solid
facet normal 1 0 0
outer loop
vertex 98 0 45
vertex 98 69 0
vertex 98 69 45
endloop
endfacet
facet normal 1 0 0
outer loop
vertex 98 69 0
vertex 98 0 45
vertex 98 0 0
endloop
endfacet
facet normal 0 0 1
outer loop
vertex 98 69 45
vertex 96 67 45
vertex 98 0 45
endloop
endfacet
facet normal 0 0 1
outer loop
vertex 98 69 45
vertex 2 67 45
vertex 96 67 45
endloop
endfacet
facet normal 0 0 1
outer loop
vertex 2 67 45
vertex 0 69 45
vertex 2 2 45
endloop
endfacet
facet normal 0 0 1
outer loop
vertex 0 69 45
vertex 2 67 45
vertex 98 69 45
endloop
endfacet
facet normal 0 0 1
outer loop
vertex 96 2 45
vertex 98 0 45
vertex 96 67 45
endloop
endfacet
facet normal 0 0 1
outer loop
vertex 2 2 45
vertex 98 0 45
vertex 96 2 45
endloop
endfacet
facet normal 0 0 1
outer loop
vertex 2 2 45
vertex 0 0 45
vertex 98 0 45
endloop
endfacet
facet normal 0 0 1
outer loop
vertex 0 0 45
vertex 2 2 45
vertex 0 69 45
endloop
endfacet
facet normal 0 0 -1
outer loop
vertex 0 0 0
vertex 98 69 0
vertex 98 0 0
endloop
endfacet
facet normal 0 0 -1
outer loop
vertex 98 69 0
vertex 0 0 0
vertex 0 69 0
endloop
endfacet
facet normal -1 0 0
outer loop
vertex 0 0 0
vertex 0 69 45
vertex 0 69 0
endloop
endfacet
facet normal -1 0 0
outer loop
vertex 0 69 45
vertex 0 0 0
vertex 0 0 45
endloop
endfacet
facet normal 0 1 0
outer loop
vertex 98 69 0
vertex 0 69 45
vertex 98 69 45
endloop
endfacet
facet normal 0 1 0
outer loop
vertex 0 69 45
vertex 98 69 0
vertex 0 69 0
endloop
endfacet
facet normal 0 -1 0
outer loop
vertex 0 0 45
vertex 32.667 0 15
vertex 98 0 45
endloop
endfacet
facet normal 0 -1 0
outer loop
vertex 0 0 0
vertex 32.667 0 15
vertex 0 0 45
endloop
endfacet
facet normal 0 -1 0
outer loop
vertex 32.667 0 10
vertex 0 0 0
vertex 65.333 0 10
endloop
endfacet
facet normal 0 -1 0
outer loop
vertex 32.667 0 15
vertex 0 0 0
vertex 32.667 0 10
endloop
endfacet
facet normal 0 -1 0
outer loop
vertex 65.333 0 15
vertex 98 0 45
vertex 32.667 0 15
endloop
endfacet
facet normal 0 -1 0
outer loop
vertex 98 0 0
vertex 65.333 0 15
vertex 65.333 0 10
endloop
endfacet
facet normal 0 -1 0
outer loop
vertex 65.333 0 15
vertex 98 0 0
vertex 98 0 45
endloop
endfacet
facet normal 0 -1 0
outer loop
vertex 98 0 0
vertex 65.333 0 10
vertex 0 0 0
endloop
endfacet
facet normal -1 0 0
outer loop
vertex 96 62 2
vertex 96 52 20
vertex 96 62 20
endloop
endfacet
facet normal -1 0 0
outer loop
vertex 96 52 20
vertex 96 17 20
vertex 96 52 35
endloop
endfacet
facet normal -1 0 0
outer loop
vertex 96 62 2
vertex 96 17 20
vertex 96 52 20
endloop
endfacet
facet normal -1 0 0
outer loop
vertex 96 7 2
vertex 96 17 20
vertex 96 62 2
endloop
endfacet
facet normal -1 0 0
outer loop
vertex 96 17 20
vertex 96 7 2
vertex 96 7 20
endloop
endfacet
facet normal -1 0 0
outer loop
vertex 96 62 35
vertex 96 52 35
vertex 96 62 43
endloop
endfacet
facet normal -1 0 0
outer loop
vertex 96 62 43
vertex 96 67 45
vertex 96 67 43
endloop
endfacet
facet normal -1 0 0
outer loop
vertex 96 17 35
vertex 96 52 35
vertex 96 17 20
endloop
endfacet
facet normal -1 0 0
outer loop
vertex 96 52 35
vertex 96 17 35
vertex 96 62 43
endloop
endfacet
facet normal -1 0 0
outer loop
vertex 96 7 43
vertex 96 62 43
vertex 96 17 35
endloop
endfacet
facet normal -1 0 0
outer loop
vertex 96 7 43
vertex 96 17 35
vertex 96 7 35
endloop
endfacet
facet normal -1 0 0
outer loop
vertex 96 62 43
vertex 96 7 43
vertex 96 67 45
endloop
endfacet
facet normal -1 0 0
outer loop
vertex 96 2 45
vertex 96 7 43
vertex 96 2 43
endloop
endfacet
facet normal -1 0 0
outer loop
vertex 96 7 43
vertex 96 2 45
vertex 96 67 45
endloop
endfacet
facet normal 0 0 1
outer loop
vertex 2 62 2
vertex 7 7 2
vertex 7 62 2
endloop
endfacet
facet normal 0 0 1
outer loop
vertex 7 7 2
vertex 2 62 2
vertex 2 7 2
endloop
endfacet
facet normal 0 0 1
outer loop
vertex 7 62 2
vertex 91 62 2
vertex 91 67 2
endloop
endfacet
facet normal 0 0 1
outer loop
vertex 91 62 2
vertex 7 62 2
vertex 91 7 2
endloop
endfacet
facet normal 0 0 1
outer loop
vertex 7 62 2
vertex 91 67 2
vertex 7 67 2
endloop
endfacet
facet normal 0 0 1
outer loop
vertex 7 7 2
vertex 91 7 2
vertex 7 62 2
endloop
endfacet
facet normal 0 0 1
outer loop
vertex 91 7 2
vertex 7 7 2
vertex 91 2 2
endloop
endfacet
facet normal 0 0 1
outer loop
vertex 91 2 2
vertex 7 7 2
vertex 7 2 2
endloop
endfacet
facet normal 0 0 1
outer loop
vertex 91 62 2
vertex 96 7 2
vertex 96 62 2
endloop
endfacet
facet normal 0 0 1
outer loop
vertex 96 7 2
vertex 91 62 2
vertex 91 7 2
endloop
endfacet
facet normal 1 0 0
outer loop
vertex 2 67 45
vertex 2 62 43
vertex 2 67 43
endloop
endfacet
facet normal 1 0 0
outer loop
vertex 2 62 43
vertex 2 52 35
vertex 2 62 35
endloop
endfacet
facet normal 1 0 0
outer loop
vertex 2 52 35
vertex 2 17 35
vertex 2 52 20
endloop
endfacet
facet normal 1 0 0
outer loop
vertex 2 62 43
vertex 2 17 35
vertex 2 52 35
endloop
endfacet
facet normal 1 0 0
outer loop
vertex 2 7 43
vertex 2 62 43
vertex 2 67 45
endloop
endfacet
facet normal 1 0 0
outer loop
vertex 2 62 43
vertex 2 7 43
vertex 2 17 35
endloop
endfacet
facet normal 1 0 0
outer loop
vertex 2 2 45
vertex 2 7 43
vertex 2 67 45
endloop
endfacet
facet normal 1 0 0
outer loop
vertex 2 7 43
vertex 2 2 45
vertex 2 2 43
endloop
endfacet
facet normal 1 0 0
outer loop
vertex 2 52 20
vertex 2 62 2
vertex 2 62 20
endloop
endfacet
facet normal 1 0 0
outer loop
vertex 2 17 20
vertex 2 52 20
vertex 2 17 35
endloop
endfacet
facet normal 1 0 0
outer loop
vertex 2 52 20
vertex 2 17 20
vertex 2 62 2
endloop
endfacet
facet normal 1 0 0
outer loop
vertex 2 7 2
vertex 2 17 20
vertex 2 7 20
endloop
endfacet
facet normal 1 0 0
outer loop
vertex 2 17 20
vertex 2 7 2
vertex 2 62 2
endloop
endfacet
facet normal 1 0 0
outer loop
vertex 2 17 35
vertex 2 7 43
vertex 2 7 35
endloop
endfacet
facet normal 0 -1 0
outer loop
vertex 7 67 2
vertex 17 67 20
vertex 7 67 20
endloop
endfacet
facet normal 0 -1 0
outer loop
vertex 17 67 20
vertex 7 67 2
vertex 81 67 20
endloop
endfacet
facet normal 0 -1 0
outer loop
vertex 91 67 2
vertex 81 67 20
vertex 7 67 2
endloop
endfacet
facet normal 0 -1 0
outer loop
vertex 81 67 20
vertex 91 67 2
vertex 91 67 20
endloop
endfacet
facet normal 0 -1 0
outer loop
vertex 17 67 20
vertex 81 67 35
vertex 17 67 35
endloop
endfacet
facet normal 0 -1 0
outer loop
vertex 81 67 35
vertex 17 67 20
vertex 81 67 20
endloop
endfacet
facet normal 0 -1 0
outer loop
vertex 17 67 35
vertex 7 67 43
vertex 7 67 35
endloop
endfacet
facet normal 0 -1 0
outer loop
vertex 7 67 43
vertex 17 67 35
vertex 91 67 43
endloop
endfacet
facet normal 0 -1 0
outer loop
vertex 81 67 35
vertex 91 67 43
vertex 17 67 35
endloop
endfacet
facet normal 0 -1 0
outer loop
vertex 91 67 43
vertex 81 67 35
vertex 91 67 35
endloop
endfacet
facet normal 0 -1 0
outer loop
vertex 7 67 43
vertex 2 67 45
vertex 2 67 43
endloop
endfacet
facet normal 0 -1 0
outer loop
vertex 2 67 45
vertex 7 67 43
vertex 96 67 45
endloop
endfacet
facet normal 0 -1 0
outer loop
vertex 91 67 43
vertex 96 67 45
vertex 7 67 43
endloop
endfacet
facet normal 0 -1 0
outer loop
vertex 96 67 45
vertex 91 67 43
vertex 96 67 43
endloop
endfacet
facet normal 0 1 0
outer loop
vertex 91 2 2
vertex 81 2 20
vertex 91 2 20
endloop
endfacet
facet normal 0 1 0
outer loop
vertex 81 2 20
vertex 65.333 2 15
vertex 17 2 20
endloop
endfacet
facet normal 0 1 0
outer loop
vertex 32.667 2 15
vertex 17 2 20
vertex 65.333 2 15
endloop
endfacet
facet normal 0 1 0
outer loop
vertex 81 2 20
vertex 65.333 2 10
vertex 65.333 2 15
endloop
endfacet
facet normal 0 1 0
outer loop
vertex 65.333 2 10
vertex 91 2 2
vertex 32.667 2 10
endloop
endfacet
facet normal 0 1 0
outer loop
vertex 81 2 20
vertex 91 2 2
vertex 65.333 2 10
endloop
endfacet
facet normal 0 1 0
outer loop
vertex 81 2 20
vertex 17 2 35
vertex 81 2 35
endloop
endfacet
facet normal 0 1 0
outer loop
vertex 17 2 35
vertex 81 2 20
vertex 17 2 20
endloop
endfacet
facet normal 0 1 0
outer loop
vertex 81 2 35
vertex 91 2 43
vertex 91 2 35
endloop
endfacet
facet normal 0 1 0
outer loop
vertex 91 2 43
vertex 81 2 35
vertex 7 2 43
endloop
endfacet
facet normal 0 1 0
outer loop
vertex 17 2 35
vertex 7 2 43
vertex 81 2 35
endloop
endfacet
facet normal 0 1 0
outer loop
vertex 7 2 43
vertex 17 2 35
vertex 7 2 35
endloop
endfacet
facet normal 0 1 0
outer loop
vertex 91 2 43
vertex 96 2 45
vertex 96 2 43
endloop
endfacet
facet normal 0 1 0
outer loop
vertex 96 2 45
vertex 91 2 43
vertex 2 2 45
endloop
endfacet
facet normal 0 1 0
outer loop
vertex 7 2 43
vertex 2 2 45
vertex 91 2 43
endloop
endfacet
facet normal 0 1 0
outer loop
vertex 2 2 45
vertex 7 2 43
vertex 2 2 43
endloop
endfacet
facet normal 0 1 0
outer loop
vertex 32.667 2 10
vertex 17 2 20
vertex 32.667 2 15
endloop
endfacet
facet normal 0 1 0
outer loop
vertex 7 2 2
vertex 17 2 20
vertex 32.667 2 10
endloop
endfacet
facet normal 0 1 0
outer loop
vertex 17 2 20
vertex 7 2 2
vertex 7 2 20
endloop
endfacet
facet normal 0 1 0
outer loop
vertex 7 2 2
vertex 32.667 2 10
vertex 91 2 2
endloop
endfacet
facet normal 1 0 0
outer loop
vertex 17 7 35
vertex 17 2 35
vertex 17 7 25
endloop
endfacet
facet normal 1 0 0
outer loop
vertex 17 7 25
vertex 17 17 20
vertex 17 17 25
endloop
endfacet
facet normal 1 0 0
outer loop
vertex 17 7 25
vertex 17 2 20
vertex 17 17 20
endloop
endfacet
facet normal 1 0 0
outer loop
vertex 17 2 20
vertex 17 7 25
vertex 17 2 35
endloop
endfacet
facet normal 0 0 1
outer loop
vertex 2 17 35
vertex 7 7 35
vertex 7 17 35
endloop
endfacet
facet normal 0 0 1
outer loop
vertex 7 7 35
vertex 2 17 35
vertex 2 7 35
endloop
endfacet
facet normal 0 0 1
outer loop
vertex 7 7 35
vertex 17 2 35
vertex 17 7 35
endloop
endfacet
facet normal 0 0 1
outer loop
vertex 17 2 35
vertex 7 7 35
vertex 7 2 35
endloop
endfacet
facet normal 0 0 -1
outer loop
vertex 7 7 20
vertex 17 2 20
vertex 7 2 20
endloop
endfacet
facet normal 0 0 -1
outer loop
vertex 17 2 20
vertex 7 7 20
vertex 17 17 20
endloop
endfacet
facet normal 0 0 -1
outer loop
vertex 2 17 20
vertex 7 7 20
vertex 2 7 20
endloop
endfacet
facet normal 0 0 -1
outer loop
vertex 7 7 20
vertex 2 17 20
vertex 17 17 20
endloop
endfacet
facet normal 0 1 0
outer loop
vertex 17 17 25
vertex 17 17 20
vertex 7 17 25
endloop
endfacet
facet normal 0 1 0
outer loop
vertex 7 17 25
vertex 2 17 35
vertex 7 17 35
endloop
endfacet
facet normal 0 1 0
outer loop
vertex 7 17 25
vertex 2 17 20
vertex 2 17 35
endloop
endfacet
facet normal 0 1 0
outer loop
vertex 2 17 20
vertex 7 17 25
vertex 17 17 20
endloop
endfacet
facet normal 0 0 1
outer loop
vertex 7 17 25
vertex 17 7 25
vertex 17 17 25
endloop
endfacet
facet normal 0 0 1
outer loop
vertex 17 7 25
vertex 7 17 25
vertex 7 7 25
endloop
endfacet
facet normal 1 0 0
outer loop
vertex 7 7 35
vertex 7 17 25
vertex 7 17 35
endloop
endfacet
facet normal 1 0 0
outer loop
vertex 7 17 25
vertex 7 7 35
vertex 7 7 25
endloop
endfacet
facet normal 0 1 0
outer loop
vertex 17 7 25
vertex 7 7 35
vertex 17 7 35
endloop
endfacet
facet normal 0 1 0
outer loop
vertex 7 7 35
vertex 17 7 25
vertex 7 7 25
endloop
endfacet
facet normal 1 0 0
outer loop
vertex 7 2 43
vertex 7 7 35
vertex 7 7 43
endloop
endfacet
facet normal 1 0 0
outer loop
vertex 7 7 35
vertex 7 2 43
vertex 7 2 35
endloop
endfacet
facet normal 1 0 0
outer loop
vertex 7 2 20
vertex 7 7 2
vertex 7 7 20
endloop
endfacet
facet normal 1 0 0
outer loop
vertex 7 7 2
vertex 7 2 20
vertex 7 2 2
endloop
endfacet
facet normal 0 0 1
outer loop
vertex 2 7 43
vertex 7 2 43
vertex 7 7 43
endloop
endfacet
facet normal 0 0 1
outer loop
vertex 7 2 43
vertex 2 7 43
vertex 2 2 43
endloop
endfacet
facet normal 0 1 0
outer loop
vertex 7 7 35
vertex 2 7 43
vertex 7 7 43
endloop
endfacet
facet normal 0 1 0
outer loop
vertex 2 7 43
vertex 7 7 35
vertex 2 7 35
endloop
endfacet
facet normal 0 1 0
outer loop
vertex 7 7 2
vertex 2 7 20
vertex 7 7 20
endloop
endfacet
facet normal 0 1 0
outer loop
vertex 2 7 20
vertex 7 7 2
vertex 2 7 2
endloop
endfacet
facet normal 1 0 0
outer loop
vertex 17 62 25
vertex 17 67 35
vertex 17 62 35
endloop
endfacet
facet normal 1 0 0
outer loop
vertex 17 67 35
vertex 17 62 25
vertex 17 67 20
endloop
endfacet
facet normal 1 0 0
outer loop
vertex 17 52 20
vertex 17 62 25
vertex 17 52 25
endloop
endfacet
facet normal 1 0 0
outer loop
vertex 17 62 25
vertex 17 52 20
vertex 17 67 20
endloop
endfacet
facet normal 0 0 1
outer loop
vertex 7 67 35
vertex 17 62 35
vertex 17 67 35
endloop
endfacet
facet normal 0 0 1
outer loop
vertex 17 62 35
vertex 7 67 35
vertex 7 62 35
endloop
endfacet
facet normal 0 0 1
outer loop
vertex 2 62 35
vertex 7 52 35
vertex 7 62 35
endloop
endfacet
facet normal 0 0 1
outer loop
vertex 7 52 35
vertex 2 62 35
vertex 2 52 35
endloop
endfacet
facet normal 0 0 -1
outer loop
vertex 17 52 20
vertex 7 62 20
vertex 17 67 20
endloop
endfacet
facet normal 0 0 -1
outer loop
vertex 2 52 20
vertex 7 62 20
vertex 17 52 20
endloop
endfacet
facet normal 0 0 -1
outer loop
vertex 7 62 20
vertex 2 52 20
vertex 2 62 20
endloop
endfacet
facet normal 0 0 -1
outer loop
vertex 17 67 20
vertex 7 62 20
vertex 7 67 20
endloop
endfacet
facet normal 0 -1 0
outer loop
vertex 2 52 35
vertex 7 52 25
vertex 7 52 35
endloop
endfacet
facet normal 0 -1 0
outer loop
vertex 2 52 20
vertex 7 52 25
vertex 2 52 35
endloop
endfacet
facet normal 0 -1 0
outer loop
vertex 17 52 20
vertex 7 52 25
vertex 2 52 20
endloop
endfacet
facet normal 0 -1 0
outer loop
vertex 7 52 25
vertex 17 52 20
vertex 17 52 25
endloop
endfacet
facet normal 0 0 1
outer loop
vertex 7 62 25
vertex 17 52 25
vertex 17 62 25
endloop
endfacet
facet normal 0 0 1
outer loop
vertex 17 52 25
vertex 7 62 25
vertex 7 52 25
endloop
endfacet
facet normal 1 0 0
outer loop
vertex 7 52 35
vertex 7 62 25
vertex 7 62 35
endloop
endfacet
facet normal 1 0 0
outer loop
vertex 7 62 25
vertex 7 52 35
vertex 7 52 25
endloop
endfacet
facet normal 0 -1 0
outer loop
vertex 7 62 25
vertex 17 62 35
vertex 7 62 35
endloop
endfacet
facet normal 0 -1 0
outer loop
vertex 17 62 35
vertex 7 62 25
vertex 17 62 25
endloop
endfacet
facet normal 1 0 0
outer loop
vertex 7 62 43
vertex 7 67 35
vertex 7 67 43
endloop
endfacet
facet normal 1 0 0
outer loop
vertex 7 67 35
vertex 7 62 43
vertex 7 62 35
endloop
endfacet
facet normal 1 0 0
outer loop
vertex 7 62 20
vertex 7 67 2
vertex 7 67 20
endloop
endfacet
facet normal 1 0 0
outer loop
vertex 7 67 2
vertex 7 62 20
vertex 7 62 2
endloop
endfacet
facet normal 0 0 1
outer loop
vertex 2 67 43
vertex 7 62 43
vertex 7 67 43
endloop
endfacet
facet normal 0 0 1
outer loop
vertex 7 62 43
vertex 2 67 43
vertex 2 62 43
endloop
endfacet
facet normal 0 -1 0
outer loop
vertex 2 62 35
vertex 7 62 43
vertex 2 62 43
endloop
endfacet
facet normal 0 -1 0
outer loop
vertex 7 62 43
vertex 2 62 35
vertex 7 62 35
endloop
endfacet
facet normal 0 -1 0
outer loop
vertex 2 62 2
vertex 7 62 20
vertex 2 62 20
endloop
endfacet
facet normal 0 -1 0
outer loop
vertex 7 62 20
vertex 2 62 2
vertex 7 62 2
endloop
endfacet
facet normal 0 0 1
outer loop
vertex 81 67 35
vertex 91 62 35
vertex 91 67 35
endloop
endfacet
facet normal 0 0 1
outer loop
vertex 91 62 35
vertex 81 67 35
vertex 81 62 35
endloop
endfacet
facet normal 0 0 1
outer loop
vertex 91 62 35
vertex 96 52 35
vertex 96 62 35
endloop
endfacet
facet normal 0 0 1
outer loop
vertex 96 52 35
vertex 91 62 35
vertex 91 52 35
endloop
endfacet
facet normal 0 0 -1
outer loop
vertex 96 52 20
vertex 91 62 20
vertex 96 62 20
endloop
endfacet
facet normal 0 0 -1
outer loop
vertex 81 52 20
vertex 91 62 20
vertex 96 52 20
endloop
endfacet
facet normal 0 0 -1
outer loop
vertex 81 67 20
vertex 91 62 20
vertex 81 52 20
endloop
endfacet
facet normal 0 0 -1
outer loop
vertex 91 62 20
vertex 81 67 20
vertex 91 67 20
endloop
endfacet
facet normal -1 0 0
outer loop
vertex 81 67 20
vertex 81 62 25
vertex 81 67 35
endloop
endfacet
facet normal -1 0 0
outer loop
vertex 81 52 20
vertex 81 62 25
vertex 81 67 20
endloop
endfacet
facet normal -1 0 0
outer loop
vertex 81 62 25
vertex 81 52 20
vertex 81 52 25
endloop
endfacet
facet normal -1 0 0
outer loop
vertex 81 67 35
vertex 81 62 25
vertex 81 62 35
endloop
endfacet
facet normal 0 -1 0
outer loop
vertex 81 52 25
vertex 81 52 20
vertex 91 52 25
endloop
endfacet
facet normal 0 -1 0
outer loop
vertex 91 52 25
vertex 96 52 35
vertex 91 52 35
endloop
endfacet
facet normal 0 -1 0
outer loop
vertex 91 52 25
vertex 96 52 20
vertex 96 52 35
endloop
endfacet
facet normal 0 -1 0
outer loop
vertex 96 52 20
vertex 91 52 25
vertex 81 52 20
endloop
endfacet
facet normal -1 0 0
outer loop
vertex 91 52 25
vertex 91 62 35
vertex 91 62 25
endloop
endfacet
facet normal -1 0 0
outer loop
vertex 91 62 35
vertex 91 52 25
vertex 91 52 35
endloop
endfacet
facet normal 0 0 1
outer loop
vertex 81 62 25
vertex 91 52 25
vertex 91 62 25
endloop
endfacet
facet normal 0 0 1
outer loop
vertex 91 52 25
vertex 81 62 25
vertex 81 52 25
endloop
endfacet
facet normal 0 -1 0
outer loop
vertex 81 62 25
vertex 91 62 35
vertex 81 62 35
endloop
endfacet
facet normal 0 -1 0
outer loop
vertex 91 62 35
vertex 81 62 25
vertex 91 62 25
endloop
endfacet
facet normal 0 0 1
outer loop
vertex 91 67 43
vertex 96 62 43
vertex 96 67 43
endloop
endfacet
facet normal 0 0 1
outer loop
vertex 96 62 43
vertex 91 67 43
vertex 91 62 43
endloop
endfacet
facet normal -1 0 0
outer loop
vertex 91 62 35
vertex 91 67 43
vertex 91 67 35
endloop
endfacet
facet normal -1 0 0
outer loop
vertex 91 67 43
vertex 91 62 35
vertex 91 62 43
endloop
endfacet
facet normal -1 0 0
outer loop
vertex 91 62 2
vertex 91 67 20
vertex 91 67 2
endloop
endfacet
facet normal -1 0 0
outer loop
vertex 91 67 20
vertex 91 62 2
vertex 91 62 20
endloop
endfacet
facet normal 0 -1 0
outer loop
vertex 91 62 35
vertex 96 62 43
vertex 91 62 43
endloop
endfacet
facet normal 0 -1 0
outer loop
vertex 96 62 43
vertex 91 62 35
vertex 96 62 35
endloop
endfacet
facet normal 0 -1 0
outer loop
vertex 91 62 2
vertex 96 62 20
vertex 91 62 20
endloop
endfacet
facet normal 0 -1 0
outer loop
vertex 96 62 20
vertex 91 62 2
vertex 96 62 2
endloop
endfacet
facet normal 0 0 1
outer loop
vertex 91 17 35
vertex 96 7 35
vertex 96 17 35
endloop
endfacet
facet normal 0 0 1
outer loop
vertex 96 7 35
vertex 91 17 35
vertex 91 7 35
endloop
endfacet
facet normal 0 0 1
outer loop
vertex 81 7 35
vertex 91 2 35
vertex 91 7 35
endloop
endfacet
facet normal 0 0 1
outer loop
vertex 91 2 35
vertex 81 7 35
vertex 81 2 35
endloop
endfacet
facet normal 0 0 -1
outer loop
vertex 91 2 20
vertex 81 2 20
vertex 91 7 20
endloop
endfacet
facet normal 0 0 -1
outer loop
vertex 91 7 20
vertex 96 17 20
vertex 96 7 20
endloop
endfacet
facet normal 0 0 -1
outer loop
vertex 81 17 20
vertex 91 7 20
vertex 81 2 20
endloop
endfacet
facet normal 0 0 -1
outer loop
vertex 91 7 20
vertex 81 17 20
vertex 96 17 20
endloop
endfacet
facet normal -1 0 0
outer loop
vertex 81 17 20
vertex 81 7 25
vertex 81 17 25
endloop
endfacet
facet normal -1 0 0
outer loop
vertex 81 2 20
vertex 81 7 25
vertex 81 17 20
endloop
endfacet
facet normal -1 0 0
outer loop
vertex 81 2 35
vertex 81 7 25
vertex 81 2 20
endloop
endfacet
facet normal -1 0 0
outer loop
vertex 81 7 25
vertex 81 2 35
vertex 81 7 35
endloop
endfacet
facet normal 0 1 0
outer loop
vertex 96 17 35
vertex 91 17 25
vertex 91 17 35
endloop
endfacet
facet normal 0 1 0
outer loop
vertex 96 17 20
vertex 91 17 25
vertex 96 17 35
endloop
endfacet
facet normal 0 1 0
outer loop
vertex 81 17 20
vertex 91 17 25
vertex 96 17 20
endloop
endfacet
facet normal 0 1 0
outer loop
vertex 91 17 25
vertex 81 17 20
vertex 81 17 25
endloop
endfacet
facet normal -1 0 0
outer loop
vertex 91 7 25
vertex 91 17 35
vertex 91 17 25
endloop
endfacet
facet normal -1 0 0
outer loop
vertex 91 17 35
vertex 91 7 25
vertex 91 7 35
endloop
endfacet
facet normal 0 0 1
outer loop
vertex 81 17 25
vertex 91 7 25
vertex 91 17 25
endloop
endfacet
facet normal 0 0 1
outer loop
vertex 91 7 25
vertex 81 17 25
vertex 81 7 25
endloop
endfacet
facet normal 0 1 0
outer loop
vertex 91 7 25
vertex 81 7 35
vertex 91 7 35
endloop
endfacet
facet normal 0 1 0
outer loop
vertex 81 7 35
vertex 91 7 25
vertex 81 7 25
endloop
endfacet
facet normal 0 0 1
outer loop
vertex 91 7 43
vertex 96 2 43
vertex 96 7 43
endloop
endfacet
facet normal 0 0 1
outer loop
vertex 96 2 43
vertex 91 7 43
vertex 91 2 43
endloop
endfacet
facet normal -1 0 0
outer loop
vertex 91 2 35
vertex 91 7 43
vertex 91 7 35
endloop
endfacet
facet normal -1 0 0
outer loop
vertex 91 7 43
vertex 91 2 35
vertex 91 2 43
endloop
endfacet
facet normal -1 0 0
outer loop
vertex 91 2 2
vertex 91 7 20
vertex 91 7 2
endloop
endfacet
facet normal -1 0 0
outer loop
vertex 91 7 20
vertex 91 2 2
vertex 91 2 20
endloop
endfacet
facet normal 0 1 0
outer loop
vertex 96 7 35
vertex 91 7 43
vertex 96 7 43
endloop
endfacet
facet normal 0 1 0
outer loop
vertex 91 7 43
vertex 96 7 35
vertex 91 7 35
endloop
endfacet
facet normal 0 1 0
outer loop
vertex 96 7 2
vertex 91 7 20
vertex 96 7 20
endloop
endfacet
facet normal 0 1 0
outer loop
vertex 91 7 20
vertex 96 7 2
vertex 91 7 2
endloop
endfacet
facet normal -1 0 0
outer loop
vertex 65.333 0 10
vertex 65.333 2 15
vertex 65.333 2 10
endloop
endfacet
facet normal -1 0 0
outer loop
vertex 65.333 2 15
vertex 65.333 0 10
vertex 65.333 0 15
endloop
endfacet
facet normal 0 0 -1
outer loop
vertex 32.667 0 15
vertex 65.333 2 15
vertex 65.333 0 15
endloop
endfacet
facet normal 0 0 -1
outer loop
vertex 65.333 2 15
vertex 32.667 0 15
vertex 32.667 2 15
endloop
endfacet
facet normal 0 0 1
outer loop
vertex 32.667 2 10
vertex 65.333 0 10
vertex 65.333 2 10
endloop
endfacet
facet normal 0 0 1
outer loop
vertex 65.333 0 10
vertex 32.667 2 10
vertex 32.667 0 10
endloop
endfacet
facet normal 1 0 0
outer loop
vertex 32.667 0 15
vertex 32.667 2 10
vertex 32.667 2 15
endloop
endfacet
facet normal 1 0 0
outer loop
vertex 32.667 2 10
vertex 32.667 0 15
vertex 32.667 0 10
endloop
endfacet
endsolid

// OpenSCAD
//settings
Height_under = 20;
Height_over = 10;
Wall_thickness = 2;
Board_length = 84;
Board_width = 55;
Board_thickness = 10;
Add_hole = true;



//calculations

Outside_box_length = Board_length + (2*(5+Wall_thickness));
Outside_box_width = Board_width + (2*(5+Wall_thickness));
Outside_box_height = Height_under + Height_over + Board_thickness + 5;
Inside_box_length =  Outside_box_length - (2*Wall_thickness);
Inside_box_width =  Outside_box_width - (2*Wall_thickness);
Inside_box_height =  Outside_box_height;

Support_height = Board_thickness + 5;
Supports_z = Height_under;




module hole(){
    //side 1
    translate([Outside_box_length/3,-1,10]){
        cube([Outside_box_length/3,5,5]);
    }
}



module hollow_box(){
    
    difference(){
        cube([Outside_box_length,Outside_box_width,Outside_box_height]);
        translate([Wall_thickness,Wall_thickness,Wall_thickness]){
            cube([Inside_box_length,Inside_box_width,Inside_box_height]);
        }
    }
}

module corner(support_x,support_y,cutout_x,cutout_y,pole_x,pole_y) {
    translate([support_x,support_y,Supports_z]){
        union(){
            difference(){
                cube([15,15,Support_height]);
                translate([cutout_x,cutout_y,5]){
                    cube([10,10,Board_thickness + 1]);
                }
            }
            translate([pole_x,pole_y,(0 - Height_under)]){
                cube([5,5,Outside_box_height - Wall_thickness]);
            }
        }
    }
}

module corners(){
     //corner 1
    length_offset =  Board_length - 10 + (Wall_thickness + 5);
    width_offset = Board_width - 10 + (Wall_thickness + 5);
    
    corner(Wall_thickness, Wall_thickness,5,5,0,0);
    corner(Wall_thickness, width_offset,5,0,0,10);
    corner(length_offset, width_offset,0,0,10,10);
    corner(length_offset, Wall_thickness,0,5,10,0);

}



difference(){
    union(){
        hollow_box();
        corners();
    }
    if (Add_hole == true){
        hole();
    }
}
